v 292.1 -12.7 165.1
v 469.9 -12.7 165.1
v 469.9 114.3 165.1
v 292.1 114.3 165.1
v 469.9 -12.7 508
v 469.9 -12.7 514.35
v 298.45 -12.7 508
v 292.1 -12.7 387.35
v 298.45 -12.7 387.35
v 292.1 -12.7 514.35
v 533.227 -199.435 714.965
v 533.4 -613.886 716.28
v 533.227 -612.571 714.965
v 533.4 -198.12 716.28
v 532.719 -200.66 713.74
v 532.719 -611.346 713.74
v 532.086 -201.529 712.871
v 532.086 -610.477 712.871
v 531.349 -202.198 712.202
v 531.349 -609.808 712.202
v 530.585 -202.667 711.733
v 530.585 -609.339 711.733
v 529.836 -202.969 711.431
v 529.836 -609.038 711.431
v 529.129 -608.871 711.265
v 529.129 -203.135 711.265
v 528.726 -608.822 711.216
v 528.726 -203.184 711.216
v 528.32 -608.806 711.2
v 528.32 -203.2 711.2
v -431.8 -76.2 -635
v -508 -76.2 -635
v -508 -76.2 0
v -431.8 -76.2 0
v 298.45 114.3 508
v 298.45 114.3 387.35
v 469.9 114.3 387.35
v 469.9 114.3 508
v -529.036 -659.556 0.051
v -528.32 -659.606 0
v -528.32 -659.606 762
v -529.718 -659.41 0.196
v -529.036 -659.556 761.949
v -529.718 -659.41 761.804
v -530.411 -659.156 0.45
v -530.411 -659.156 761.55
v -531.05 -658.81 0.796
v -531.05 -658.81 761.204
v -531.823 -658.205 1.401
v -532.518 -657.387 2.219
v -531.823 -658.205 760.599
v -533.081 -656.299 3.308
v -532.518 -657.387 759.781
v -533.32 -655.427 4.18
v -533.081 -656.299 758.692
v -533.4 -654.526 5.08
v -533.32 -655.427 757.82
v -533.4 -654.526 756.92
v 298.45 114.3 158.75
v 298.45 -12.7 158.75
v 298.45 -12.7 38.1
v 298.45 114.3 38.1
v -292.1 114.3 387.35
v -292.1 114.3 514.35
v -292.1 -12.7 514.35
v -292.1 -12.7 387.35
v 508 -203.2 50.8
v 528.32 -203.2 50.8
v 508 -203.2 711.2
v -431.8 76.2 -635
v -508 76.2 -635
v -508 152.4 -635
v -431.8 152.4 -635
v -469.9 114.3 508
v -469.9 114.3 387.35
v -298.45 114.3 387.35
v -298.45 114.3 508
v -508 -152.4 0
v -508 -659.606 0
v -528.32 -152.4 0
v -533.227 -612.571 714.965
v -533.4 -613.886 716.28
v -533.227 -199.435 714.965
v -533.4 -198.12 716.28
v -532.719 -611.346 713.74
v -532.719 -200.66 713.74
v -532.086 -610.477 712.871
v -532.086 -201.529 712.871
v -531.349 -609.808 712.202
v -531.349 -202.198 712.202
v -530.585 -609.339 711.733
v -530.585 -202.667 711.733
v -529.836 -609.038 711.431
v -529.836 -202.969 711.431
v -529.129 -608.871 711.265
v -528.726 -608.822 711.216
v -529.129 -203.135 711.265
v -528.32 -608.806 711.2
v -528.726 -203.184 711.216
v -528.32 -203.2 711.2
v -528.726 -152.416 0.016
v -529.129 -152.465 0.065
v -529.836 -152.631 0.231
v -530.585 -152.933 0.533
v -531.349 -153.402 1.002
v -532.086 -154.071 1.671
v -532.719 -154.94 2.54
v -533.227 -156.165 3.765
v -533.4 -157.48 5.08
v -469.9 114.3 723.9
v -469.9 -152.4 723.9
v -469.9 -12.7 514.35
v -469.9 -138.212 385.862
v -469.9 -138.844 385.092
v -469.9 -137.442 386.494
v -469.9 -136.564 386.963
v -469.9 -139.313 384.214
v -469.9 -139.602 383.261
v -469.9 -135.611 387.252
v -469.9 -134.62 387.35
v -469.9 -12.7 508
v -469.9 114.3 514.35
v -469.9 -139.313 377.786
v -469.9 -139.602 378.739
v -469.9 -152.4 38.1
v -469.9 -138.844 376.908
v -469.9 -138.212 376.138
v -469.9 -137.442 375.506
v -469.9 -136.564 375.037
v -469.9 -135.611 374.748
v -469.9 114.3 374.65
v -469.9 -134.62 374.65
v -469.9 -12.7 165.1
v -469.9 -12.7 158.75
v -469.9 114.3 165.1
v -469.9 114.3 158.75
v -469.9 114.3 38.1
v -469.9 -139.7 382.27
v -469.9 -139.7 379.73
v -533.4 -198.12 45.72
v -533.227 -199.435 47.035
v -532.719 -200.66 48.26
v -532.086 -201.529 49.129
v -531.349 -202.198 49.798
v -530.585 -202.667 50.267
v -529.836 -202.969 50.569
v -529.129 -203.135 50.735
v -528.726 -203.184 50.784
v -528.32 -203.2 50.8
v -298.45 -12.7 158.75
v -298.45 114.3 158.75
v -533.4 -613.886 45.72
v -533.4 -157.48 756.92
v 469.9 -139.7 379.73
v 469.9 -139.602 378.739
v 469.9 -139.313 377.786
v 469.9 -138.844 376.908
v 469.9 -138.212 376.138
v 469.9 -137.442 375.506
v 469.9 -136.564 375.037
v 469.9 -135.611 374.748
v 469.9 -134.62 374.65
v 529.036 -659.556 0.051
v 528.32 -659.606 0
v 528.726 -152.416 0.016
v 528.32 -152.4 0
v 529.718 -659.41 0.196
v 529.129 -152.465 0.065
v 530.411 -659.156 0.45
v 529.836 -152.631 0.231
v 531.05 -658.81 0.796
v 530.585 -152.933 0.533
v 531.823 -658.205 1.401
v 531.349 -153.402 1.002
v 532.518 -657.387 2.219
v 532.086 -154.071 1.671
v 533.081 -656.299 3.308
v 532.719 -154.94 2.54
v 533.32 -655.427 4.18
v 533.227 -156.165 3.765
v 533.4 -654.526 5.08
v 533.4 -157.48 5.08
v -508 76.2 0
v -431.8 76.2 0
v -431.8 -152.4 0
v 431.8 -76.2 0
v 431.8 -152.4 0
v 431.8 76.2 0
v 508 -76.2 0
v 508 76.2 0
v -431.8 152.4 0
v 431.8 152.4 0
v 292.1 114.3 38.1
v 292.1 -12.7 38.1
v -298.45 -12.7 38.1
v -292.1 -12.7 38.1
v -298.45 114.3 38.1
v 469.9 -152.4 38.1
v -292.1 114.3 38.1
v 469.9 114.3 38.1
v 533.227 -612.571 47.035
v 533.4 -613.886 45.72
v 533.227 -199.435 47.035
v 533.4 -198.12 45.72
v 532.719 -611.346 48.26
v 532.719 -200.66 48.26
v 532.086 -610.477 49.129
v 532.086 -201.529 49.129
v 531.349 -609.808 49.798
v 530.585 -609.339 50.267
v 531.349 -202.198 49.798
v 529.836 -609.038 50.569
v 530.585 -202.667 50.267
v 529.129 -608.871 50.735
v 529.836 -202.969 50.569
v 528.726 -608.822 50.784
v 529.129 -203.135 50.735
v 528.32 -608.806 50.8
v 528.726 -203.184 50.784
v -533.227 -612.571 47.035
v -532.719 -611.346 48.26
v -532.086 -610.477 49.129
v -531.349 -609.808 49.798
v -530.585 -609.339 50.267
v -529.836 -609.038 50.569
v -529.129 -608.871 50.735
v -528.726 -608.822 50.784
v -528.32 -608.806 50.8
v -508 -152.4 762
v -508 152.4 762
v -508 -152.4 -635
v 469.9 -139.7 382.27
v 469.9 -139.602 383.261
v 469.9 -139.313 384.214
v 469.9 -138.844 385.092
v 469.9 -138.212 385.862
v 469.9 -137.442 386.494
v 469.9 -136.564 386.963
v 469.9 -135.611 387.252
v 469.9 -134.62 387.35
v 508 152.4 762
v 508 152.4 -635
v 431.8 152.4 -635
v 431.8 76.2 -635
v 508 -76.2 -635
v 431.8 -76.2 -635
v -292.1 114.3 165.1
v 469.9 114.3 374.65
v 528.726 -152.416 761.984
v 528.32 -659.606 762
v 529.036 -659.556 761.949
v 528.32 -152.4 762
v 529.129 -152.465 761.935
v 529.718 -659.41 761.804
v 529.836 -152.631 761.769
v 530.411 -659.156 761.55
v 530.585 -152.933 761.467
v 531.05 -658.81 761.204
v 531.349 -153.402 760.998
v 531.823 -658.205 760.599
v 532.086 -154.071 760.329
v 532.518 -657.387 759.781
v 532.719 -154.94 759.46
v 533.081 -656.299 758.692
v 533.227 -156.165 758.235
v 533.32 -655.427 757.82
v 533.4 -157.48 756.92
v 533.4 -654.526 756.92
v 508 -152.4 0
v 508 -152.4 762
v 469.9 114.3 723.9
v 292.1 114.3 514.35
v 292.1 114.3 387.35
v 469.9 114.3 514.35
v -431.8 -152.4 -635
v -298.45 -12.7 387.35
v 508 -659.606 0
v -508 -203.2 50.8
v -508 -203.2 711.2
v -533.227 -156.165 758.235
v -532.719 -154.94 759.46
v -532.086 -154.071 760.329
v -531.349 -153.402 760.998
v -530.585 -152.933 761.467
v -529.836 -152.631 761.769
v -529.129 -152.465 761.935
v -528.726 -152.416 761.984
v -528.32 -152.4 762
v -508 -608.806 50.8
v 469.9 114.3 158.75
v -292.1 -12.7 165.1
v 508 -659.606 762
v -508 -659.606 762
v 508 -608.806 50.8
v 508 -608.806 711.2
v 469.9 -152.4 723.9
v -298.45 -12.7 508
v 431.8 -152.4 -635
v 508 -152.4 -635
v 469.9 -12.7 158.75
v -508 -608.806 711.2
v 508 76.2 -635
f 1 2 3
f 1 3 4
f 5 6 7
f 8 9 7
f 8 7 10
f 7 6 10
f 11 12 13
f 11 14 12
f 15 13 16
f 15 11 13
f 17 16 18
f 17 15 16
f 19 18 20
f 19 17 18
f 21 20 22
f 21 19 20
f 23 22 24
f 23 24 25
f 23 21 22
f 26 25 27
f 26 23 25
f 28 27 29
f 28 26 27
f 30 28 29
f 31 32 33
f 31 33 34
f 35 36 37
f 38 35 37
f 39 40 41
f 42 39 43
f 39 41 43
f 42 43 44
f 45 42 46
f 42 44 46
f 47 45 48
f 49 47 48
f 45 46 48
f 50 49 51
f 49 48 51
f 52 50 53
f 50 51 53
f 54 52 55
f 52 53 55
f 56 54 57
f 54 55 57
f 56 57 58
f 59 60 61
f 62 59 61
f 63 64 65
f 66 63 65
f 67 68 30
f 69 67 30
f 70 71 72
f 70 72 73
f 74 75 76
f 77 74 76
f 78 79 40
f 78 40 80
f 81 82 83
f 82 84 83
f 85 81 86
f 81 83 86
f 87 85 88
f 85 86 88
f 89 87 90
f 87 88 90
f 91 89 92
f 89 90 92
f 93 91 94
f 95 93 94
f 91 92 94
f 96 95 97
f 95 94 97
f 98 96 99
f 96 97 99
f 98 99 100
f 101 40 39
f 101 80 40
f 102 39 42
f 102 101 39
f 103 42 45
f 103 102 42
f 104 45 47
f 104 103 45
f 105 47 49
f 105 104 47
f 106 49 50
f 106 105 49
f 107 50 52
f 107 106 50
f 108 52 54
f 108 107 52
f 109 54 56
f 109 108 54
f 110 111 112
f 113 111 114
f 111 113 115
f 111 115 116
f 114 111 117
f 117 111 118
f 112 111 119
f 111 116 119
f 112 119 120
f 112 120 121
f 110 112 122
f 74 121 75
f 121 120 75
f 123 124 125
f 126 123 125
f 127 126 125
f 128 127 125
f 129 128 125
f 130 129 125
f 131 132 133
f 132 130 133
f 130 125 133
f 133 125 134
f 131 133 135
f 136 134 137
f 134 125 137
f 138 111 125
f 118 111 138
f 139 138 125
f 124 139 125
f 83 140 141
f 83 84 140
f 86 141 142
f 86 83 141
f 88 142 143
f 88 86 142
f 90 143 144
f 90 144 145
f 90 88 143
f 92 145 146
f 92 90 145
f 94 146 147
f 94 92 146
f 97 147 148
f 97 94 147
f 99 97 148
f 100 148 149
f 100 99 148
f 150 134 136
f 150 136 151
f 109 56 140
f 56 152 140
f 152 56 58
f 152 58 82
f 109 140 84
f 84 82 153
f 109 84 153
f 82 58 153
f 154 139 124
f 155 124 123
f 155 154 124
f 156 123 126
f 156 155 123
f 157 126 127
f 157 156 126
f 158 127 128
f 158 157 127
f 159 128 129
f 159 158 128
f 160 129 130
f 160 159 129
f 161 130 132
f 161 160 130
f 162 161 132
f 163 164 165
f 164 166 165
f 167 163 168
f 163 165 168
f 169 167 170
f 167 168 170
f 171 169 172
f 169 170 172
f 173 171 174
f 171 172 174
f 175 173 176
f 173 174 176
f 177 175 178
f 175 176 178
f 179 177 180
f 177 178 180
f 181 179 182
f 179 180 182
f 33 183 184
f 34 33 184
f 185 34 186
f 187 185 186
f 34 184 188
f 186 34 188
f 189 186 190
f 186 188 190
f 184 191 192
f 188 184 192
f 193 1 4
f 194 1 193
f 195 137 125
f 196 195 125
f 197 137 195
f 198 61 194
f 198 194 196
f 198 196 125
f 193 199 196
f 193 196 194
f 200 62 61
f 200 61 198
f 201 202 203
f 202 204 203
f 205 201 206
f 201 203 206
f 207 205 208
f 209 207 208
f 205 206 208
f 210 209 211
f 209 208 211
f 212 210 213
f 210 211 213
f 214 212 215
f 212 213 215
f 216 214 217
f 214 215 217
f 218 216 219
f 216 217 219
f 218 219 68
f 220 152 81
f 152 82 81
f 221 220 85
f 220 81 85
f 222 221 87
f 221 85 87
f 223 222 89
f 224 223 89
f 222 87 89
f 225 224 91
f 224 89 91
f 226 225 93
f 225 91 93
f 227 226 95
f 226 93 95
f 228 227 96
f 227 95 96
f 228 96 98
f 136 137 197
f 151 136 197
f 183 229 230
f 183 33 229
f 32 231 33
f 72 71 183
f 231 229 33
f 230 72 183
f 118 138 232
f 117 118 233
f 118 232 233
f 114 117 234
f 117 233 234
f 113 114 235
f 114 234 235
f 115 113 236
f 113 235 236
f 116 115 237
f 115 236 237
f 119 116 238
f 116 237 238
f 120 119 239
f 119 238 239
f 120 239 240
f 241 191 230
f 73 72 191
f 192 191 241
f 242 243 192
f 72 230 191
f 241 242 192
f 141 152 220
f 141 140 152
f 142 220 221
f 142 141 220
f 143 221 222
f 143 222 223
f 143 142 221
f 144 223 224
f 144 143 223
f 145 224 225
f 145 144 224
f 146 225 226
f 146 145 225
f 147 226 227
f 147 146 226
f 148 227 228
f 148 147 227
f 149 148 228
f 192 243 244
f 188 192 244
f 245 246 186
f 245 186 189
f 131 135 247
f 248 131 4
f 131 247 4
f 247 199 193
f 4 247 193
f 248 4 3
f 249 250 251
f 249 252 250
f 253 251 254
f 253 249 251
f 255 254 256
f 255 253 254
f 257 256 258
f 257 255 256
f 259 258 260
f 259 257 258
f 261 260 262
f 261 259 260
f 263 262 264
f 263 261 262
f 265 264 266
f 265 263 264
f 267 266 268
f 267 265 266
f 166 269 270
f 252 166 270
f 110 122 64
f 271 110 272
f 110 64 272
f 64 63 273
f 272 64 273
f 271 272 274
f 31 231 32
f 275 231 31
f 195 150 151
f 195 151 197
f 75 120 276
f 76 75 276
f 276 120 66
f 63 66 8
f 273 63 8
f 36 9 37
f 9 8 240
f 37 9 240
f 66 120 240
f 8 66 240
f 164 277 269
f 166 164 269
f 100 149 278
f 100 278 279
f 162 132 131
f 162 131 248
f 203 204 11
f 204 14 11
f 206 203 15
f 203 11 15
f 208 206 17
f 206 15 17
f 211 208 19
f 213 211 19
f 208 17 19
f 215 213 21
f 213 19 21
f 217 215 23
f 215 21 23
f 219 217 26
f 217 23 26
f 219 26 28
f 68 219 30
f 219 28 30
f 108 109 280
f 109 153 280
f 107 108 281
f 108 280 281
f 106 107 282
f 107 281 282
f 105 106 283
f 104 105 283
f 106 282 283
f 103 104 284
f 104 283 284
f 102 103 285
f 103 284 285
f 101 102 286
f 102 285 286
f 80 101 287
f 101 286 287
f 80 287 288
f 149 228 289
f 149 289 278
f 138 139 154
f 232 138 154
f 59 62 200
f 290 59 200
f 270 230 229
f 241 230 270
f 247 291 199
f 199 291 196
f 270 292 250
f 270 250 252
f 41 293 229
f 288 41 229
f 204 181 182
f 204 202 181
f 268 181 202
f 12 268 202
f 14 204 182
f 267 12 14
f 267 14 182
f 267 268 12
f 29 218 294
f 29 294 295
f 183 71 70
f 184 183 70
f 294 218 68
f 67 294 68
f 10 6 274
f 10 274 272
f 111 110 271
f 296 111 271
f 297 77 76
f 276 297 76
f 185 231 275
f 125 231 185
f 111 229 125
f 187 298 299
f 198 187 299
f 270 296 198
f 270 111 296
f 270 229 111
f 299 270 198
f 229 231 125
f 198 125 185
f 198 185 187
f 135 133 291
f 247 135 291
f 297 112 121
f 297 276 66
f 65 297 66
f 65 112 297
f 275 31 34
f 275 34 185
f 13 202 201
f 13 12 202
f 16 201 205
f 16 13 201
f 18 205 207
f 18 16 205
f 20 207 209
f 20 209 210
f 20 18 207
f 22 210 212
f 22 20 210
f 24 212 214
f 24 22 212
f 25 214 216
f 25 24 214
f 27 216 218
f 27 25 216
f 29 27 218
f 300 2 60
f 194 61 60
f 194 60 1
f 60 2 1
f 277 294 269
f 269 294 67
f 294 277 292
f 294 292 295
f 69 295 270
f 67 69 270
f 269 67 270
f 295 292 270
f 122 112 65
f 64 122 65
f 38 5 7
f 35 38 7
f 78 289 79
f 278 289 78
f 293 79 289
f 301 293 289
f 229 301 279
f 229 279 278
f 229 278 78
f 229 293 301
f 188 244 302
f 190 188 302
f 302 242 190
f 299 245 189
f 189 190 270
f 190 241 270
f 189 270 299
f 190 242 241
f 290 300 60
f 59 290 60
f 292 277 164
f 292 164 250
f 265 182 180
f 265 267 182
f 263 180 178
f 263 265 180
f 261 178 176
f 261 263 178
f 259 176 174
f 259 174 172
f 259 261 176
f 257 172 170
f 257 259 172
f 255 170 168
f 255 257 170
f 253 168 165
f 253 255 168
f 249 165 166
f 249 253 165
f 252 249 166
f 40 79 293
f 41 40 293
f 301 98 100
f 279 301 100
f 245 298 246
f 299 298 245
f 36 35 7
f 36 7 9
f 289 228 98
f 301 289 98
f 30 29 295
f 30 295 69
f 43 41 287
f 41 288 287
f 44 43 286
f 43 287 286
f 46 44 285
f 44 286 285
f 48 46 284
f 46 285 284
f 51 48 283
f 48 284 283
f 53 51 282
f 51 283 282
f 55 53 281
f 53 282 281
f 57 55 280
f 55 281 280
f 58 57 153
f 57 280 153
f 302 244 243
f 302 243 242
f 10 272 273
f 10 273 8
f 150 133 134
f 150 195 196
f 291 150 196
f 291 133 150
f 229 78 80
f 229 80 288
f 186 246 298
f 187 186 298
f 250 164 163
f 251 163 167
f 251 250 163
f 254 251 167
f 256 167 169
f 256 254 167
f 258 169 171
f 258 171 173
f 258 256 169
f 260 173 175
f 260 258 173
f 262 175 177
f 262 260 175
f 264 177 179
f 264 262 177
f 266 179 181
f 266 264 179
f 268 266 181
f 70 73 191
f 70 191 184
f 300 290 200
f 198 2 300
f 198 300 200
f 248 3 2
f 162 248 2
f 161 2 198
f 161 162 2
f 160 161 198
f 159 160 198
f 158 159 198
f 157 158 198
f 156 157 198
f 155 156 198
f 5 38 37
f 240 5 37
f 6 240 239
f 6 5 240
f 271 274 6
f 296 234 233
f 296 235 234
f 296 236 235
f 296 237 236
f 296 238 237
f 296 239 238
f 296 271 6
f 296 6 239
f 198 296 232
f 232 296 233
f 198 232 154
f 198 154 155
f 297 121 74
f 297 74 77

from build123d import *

# Parameters (mm, degrees)
F0_W               = 1016
F0_H               = 304.8
F1_DEPTH           = 762
F2_W               = 76.2
F2_H               = 76.2
F3_DEPTH           = 635
F4_T               = 38.1
F4_T3_DEPTH        = 152.4
F4_T5_DEPTH        = 152.4
F4_T7_DEPTH        = 152.4
F4_T9_DEPTH        = 152.4
F6_E14_W           = 939.8
F6_E14_H           = 254
F7_DEPTH           = 6.35
F10_E15_W          = 177.8
F10_E15_H          = 127
F10_E19_W          = 177.8
F10_E19_H          = 127
F10_E17_MIRRORCS_W = 177.8
F10_E17_MIRRORCS_H = 127
F10_E21_MIRRORCS_W = 177.8
F10_E21_MIRRORCS_H = 127
F11_DEPTH          = 6.35
F10_E16_W          = 127
F10_E16_H          = 127
F10_E20_W          = 127
F10_E20_H          = 127
F12_DEPTH          = 6.35
F10_E18_MIRRORCS_W = 127
F10_E18_MIRRORCS_H = 127
F10_E22_MIRRORCS_W = 127
F10_E22_MIRRORCS_H = 127
F13_DEPTH          = 6.35
F15_W              = 507.20625
F15_H              = 762
F16_DEPTH          = 25.4
F17_W              = 405.60625
F17_H              = 660.4
F18_DEPTH          = 25.4
F19_R              = 5.08
F21_R              = 5.08


# Not quite as in the source:
# - a shell that OpenCascade refuses in one call is made with other operations: the cavity is built on its own and cut out


with BuildPart() as f1:
    # F0 (on Top) → F1 (new body)
    with BuildSketch(Plane.XY):
        Rectangle(F0_W, F0_H)
    extrude(amount=F1_DEPTH)

    # F2 (on face) → F3 (join)
    with BuildSketch(Plane(origin=(0, 0, 0), x_dir=(1, 0, 0), z_dir=(0, 0, -1))):
        with Locations((469.9, 114.3)):
            Rectangle(F2_W, F2_H)
        with Locations((469.9, -114.3)):
            Rectangle(F2_W, F2_H)
        with Locations((-469.9, 114.3)):
            Rectangle(F2_W, F2_H)
        with Locations((-469.9, -114.3)):
            Rectangle(F2_W, F2_H)
    extrude(amount=F3_DEPTH)

    # F4: shell of thickness 38.1, made by hand


with BuildPart() as f4_core1:
    # F4_t2: copy of F1
    add(f1.part)

    # the walls: a layer under each face that stays
    f4_faces = [f4_core1.faces().sort_by_distance(p)[0] for p in [
        (-469.9, -114.3, -635),
        (-469.9, -76.2, -317.5),
        (-431.8, -114.3, -317.5),
        (0, 0, 0),
        (469.9, -76.2, -317.5),
        (469.9, 76.2, -317.5),
        (469.9, 114.3, -635),
        (431.8, 114.3, -317.5),
        (0, 152.4, 63.5),
        (-469.9, 114.3, -635),
        (-431.8, 114.3, -317.5),
        (-469.9, 76.2, -317.5),
        (431.8, -114.3, -317.5),
        (469.9, -114.3, -635),
        (508, 0, 63.5),
        (0, 0, 762),
        (-508, 0, 63.5),
    ]]
    thicken(f4_faces, amount=-F4_T, mode=Mode.SUBTRACT)

    # F4_s4 → F4_t3 (cut)
    with BuildSketch(Plane.YZ.offset(-546.1)):
        Polygon((-75.819, -0.381), (-114.3, 0), (-114.3, 38.1), (-76.2, 38.1), align=None)
        Polygon((75.819, -0.381), (76.2, 38.1), (114.3, 38.1), (114.3, 0), align=None)
    extrude(amount=F4_T3_DEPTH, mode=Mode.SUBTRACT)

    # F4_s6 → F4_t5 (cut)
    with BuildSketch(Plane.XZ.offset(38.1)):
        Polygon((-431.419, -0.381), (-469.9, 0), (-469.9, 38.1), (-431.8, 38.1), align=None)
        Polygon((431.419, -0.381), (431.8, 38.1), (469.9, 38.1), (469.9, 0), align=None)
    extrude(amount=F4_T5_DEPTH, mode=Mode.SUBTRACT)

    # F4_s8 → F4_t7 (cut)
    with BuildSketch(Plane.XZ.offset(-190.5)):
        Polygon((-431.419, -0.381), (-431.8, 38.1), (-469.9, 38.1), (-469.9, 0), align=None)
        Polygon((431.419, -0.381), (431.8, 38.1), (469.9, 38.1), (469.9, 0), align=None)
    extrude(amount=F4_T7_DEPTH, mode=Mode.SUBTRACT)

    # F4_s10 → F4_t9 (cut)
    with BuildSketch(Plane.YZ.offset(393.7)):
        Polygon((75.819, -0.381), (76.2, 38.1), (114.3, 38.1), (114.3, 0), align=None)
        Polygon((-75.819, -0.381), (-76.2, 38.1), (-114.3, 38.1), (-114.3, 0), align=None)
    extrude(amount=F4_T9_DEPTH, mode=Mode.SUBTRACT)


with BuildPart() as f1_1:
    add(f1.part)

    # what is left inside the walls is the cavity
    f4_cavity = [f4_core1.part.solids().sort_by_distance(p)[0] for p in [
        (0, -152.019, 495.3),
    ]]
    add(f4_cavity, mode=Mode.SUBTRACT)

    # F6_E14 (on explicit) → F7 (join, symmetric)
    with BuildSketch(Plane(origin=(-469.9, 114.3, 381), x_dir=(1, 0, 0), z_dir=(0, 0, -1))):
        with Locations((469.9, 127)):
            Rectangle(F6_E14_W, F6_E14_H)
    extrude(amount=F7_DEPTH, both=True)

    # F10_E15 (on explicit) + F10_E19 (on explicit) + F10_E17_MirrorCS (on explicit) + F10_E21_MirrorCS (on explicit) → F11 (join)
    with BuildSketch(Plane(origin=(-469.9, 114.3, 514.35), x_dir=(1, 0, 0), z_dir=(0, 0, -1))):
        with Locations((88.9, 63.5)):
            Rectangle(F10_E15_W, F10_E15_H)
    with BuildSketch(Plane(origin=(-469.9, 114.3, 165.1), x_dir=(1, 0, 0), z_dir=(0, 0, -1))):
        with Locations((88.9, 63.5)):
            Rectangle(F10_E19_W, F10_E19_H)
    with BuildSketch(Plane(origin=(469.9, 114.3, 514.35), x_dir=(-1, 0, 0), z_dir=(0, 0, 1))):
        with Locations((88.9, 63.5)):
            Rectangle(F10_E17_MIRRORCS_W, F10_E17_MIRRORCS_H)
    with BuildSketch(Plane(origin=(469.9, 114.3, 165.1), x_dir=(-1, 0, 0), z_dir=(0, 0, 1))):
        with Locations((88.9, 63.5)):
            Rectangle(F10_E21_MIRRORCS_W, F10_E21_MIRRORCS_H)
    extrude(amount=F11_DEPTH, dir=(0, 0, -1))

    # F10_E16 (on explicit) + F10_E20 (on explicit) → F12 (join)
    with BuildSketch(Plane(origin=(-292.1, 114.3, 514.35), x_dir=(0, 0, -1), z_dir=(-1, 0, 0))):
        with Locations((63.5, 63.5)):
            Rectangle(F10_E16_W, F10_E16_H)
    with BuildSketch(Plane(origin=(-292.1, 114.3, 165.1), x_dir=(0, 0, -1), z_dir=(-1, 0, 0))):
        with Locations((63.5, 63.5)):
            Rectangle(F10_E20_W, F10_E20_H)
    extrude(amount=F12_DEPTH)

    # F10_E18_MirrorCS (on explicit) + F10_E22_MirrorCS (on explicit) → F13 (join)
    with BuildSketch(Plane(origin=(292.1, 114.3, 514.35), x_dir=(0, 0, -1), z_dir=(-1, 0, 0))):
        with Locations((63.5, 63.5)):
            Rectangle(F10_E18_MIRRORCS_W, F10_E18_MIRRORCS_H)
    with BuildSketch(Plane(origin=(292.1, 114.3, 165.1), x_dir=(0, 0, -1), z_dir=(-1, 0, 0))):
        with Locations((63.5, 63.5)):
            Rectangle(F10_E22_MIRRORCS_W, F10_E22_MIRRORCS_H)
    extrude(amount=-F13_DEPTH)

    # F21
    f21_edges = [f1_1.edges().sort_by_distance(p)[0] for p in [
        (0, -139.7, 374.65),
        (0, -139.7, 387.35),
    ]]
    fillet(f21_edges, radius=F21_R)


with BuildPart() as f16:
    # F15 (on offset) → F16 (new body)
    with BuildSketch(Plane.YZ.offset(508)):
        with Locations((-406.003125, 381)):
            Rectangle(F15_W, F15_H)
    extrude(amount=F16_DEPTH)

    # F17 (on face) → F18 (cut)
    with BuildSketch(Plane.YZ.offset(533.4)):
        with Locations((-406.003125, 381)):
            Rectangle(F17_W, F17_H)
    extrude(amount=-F18_DEPTH, mode=Mode.SUBTRACT)

    # F19
    f19_edges = [f16.edges().sort_by_distance(p)[0] for p in [
        (533.4, -152.4, 381),
        (533.4, -406.003125, 0),
        (533.4, -406.003125, 762),
        (533.4, -659.60625, 381),
        (533.4, -406.003125, 50.8),
        (533.4, -203.2, 381),
        (533.4, -406.003125, 711.2),
        (533.4, -608.80625, 381),
    ]]
    fillet(f19_edges, radius=F19_R)


with BuildPart() as f20_1:
    # F20: instance of F16
    add(f16.part.mirror(Plane.YZ))


solid = Compound([f1_1.part, f16.part, f20_1.part])
